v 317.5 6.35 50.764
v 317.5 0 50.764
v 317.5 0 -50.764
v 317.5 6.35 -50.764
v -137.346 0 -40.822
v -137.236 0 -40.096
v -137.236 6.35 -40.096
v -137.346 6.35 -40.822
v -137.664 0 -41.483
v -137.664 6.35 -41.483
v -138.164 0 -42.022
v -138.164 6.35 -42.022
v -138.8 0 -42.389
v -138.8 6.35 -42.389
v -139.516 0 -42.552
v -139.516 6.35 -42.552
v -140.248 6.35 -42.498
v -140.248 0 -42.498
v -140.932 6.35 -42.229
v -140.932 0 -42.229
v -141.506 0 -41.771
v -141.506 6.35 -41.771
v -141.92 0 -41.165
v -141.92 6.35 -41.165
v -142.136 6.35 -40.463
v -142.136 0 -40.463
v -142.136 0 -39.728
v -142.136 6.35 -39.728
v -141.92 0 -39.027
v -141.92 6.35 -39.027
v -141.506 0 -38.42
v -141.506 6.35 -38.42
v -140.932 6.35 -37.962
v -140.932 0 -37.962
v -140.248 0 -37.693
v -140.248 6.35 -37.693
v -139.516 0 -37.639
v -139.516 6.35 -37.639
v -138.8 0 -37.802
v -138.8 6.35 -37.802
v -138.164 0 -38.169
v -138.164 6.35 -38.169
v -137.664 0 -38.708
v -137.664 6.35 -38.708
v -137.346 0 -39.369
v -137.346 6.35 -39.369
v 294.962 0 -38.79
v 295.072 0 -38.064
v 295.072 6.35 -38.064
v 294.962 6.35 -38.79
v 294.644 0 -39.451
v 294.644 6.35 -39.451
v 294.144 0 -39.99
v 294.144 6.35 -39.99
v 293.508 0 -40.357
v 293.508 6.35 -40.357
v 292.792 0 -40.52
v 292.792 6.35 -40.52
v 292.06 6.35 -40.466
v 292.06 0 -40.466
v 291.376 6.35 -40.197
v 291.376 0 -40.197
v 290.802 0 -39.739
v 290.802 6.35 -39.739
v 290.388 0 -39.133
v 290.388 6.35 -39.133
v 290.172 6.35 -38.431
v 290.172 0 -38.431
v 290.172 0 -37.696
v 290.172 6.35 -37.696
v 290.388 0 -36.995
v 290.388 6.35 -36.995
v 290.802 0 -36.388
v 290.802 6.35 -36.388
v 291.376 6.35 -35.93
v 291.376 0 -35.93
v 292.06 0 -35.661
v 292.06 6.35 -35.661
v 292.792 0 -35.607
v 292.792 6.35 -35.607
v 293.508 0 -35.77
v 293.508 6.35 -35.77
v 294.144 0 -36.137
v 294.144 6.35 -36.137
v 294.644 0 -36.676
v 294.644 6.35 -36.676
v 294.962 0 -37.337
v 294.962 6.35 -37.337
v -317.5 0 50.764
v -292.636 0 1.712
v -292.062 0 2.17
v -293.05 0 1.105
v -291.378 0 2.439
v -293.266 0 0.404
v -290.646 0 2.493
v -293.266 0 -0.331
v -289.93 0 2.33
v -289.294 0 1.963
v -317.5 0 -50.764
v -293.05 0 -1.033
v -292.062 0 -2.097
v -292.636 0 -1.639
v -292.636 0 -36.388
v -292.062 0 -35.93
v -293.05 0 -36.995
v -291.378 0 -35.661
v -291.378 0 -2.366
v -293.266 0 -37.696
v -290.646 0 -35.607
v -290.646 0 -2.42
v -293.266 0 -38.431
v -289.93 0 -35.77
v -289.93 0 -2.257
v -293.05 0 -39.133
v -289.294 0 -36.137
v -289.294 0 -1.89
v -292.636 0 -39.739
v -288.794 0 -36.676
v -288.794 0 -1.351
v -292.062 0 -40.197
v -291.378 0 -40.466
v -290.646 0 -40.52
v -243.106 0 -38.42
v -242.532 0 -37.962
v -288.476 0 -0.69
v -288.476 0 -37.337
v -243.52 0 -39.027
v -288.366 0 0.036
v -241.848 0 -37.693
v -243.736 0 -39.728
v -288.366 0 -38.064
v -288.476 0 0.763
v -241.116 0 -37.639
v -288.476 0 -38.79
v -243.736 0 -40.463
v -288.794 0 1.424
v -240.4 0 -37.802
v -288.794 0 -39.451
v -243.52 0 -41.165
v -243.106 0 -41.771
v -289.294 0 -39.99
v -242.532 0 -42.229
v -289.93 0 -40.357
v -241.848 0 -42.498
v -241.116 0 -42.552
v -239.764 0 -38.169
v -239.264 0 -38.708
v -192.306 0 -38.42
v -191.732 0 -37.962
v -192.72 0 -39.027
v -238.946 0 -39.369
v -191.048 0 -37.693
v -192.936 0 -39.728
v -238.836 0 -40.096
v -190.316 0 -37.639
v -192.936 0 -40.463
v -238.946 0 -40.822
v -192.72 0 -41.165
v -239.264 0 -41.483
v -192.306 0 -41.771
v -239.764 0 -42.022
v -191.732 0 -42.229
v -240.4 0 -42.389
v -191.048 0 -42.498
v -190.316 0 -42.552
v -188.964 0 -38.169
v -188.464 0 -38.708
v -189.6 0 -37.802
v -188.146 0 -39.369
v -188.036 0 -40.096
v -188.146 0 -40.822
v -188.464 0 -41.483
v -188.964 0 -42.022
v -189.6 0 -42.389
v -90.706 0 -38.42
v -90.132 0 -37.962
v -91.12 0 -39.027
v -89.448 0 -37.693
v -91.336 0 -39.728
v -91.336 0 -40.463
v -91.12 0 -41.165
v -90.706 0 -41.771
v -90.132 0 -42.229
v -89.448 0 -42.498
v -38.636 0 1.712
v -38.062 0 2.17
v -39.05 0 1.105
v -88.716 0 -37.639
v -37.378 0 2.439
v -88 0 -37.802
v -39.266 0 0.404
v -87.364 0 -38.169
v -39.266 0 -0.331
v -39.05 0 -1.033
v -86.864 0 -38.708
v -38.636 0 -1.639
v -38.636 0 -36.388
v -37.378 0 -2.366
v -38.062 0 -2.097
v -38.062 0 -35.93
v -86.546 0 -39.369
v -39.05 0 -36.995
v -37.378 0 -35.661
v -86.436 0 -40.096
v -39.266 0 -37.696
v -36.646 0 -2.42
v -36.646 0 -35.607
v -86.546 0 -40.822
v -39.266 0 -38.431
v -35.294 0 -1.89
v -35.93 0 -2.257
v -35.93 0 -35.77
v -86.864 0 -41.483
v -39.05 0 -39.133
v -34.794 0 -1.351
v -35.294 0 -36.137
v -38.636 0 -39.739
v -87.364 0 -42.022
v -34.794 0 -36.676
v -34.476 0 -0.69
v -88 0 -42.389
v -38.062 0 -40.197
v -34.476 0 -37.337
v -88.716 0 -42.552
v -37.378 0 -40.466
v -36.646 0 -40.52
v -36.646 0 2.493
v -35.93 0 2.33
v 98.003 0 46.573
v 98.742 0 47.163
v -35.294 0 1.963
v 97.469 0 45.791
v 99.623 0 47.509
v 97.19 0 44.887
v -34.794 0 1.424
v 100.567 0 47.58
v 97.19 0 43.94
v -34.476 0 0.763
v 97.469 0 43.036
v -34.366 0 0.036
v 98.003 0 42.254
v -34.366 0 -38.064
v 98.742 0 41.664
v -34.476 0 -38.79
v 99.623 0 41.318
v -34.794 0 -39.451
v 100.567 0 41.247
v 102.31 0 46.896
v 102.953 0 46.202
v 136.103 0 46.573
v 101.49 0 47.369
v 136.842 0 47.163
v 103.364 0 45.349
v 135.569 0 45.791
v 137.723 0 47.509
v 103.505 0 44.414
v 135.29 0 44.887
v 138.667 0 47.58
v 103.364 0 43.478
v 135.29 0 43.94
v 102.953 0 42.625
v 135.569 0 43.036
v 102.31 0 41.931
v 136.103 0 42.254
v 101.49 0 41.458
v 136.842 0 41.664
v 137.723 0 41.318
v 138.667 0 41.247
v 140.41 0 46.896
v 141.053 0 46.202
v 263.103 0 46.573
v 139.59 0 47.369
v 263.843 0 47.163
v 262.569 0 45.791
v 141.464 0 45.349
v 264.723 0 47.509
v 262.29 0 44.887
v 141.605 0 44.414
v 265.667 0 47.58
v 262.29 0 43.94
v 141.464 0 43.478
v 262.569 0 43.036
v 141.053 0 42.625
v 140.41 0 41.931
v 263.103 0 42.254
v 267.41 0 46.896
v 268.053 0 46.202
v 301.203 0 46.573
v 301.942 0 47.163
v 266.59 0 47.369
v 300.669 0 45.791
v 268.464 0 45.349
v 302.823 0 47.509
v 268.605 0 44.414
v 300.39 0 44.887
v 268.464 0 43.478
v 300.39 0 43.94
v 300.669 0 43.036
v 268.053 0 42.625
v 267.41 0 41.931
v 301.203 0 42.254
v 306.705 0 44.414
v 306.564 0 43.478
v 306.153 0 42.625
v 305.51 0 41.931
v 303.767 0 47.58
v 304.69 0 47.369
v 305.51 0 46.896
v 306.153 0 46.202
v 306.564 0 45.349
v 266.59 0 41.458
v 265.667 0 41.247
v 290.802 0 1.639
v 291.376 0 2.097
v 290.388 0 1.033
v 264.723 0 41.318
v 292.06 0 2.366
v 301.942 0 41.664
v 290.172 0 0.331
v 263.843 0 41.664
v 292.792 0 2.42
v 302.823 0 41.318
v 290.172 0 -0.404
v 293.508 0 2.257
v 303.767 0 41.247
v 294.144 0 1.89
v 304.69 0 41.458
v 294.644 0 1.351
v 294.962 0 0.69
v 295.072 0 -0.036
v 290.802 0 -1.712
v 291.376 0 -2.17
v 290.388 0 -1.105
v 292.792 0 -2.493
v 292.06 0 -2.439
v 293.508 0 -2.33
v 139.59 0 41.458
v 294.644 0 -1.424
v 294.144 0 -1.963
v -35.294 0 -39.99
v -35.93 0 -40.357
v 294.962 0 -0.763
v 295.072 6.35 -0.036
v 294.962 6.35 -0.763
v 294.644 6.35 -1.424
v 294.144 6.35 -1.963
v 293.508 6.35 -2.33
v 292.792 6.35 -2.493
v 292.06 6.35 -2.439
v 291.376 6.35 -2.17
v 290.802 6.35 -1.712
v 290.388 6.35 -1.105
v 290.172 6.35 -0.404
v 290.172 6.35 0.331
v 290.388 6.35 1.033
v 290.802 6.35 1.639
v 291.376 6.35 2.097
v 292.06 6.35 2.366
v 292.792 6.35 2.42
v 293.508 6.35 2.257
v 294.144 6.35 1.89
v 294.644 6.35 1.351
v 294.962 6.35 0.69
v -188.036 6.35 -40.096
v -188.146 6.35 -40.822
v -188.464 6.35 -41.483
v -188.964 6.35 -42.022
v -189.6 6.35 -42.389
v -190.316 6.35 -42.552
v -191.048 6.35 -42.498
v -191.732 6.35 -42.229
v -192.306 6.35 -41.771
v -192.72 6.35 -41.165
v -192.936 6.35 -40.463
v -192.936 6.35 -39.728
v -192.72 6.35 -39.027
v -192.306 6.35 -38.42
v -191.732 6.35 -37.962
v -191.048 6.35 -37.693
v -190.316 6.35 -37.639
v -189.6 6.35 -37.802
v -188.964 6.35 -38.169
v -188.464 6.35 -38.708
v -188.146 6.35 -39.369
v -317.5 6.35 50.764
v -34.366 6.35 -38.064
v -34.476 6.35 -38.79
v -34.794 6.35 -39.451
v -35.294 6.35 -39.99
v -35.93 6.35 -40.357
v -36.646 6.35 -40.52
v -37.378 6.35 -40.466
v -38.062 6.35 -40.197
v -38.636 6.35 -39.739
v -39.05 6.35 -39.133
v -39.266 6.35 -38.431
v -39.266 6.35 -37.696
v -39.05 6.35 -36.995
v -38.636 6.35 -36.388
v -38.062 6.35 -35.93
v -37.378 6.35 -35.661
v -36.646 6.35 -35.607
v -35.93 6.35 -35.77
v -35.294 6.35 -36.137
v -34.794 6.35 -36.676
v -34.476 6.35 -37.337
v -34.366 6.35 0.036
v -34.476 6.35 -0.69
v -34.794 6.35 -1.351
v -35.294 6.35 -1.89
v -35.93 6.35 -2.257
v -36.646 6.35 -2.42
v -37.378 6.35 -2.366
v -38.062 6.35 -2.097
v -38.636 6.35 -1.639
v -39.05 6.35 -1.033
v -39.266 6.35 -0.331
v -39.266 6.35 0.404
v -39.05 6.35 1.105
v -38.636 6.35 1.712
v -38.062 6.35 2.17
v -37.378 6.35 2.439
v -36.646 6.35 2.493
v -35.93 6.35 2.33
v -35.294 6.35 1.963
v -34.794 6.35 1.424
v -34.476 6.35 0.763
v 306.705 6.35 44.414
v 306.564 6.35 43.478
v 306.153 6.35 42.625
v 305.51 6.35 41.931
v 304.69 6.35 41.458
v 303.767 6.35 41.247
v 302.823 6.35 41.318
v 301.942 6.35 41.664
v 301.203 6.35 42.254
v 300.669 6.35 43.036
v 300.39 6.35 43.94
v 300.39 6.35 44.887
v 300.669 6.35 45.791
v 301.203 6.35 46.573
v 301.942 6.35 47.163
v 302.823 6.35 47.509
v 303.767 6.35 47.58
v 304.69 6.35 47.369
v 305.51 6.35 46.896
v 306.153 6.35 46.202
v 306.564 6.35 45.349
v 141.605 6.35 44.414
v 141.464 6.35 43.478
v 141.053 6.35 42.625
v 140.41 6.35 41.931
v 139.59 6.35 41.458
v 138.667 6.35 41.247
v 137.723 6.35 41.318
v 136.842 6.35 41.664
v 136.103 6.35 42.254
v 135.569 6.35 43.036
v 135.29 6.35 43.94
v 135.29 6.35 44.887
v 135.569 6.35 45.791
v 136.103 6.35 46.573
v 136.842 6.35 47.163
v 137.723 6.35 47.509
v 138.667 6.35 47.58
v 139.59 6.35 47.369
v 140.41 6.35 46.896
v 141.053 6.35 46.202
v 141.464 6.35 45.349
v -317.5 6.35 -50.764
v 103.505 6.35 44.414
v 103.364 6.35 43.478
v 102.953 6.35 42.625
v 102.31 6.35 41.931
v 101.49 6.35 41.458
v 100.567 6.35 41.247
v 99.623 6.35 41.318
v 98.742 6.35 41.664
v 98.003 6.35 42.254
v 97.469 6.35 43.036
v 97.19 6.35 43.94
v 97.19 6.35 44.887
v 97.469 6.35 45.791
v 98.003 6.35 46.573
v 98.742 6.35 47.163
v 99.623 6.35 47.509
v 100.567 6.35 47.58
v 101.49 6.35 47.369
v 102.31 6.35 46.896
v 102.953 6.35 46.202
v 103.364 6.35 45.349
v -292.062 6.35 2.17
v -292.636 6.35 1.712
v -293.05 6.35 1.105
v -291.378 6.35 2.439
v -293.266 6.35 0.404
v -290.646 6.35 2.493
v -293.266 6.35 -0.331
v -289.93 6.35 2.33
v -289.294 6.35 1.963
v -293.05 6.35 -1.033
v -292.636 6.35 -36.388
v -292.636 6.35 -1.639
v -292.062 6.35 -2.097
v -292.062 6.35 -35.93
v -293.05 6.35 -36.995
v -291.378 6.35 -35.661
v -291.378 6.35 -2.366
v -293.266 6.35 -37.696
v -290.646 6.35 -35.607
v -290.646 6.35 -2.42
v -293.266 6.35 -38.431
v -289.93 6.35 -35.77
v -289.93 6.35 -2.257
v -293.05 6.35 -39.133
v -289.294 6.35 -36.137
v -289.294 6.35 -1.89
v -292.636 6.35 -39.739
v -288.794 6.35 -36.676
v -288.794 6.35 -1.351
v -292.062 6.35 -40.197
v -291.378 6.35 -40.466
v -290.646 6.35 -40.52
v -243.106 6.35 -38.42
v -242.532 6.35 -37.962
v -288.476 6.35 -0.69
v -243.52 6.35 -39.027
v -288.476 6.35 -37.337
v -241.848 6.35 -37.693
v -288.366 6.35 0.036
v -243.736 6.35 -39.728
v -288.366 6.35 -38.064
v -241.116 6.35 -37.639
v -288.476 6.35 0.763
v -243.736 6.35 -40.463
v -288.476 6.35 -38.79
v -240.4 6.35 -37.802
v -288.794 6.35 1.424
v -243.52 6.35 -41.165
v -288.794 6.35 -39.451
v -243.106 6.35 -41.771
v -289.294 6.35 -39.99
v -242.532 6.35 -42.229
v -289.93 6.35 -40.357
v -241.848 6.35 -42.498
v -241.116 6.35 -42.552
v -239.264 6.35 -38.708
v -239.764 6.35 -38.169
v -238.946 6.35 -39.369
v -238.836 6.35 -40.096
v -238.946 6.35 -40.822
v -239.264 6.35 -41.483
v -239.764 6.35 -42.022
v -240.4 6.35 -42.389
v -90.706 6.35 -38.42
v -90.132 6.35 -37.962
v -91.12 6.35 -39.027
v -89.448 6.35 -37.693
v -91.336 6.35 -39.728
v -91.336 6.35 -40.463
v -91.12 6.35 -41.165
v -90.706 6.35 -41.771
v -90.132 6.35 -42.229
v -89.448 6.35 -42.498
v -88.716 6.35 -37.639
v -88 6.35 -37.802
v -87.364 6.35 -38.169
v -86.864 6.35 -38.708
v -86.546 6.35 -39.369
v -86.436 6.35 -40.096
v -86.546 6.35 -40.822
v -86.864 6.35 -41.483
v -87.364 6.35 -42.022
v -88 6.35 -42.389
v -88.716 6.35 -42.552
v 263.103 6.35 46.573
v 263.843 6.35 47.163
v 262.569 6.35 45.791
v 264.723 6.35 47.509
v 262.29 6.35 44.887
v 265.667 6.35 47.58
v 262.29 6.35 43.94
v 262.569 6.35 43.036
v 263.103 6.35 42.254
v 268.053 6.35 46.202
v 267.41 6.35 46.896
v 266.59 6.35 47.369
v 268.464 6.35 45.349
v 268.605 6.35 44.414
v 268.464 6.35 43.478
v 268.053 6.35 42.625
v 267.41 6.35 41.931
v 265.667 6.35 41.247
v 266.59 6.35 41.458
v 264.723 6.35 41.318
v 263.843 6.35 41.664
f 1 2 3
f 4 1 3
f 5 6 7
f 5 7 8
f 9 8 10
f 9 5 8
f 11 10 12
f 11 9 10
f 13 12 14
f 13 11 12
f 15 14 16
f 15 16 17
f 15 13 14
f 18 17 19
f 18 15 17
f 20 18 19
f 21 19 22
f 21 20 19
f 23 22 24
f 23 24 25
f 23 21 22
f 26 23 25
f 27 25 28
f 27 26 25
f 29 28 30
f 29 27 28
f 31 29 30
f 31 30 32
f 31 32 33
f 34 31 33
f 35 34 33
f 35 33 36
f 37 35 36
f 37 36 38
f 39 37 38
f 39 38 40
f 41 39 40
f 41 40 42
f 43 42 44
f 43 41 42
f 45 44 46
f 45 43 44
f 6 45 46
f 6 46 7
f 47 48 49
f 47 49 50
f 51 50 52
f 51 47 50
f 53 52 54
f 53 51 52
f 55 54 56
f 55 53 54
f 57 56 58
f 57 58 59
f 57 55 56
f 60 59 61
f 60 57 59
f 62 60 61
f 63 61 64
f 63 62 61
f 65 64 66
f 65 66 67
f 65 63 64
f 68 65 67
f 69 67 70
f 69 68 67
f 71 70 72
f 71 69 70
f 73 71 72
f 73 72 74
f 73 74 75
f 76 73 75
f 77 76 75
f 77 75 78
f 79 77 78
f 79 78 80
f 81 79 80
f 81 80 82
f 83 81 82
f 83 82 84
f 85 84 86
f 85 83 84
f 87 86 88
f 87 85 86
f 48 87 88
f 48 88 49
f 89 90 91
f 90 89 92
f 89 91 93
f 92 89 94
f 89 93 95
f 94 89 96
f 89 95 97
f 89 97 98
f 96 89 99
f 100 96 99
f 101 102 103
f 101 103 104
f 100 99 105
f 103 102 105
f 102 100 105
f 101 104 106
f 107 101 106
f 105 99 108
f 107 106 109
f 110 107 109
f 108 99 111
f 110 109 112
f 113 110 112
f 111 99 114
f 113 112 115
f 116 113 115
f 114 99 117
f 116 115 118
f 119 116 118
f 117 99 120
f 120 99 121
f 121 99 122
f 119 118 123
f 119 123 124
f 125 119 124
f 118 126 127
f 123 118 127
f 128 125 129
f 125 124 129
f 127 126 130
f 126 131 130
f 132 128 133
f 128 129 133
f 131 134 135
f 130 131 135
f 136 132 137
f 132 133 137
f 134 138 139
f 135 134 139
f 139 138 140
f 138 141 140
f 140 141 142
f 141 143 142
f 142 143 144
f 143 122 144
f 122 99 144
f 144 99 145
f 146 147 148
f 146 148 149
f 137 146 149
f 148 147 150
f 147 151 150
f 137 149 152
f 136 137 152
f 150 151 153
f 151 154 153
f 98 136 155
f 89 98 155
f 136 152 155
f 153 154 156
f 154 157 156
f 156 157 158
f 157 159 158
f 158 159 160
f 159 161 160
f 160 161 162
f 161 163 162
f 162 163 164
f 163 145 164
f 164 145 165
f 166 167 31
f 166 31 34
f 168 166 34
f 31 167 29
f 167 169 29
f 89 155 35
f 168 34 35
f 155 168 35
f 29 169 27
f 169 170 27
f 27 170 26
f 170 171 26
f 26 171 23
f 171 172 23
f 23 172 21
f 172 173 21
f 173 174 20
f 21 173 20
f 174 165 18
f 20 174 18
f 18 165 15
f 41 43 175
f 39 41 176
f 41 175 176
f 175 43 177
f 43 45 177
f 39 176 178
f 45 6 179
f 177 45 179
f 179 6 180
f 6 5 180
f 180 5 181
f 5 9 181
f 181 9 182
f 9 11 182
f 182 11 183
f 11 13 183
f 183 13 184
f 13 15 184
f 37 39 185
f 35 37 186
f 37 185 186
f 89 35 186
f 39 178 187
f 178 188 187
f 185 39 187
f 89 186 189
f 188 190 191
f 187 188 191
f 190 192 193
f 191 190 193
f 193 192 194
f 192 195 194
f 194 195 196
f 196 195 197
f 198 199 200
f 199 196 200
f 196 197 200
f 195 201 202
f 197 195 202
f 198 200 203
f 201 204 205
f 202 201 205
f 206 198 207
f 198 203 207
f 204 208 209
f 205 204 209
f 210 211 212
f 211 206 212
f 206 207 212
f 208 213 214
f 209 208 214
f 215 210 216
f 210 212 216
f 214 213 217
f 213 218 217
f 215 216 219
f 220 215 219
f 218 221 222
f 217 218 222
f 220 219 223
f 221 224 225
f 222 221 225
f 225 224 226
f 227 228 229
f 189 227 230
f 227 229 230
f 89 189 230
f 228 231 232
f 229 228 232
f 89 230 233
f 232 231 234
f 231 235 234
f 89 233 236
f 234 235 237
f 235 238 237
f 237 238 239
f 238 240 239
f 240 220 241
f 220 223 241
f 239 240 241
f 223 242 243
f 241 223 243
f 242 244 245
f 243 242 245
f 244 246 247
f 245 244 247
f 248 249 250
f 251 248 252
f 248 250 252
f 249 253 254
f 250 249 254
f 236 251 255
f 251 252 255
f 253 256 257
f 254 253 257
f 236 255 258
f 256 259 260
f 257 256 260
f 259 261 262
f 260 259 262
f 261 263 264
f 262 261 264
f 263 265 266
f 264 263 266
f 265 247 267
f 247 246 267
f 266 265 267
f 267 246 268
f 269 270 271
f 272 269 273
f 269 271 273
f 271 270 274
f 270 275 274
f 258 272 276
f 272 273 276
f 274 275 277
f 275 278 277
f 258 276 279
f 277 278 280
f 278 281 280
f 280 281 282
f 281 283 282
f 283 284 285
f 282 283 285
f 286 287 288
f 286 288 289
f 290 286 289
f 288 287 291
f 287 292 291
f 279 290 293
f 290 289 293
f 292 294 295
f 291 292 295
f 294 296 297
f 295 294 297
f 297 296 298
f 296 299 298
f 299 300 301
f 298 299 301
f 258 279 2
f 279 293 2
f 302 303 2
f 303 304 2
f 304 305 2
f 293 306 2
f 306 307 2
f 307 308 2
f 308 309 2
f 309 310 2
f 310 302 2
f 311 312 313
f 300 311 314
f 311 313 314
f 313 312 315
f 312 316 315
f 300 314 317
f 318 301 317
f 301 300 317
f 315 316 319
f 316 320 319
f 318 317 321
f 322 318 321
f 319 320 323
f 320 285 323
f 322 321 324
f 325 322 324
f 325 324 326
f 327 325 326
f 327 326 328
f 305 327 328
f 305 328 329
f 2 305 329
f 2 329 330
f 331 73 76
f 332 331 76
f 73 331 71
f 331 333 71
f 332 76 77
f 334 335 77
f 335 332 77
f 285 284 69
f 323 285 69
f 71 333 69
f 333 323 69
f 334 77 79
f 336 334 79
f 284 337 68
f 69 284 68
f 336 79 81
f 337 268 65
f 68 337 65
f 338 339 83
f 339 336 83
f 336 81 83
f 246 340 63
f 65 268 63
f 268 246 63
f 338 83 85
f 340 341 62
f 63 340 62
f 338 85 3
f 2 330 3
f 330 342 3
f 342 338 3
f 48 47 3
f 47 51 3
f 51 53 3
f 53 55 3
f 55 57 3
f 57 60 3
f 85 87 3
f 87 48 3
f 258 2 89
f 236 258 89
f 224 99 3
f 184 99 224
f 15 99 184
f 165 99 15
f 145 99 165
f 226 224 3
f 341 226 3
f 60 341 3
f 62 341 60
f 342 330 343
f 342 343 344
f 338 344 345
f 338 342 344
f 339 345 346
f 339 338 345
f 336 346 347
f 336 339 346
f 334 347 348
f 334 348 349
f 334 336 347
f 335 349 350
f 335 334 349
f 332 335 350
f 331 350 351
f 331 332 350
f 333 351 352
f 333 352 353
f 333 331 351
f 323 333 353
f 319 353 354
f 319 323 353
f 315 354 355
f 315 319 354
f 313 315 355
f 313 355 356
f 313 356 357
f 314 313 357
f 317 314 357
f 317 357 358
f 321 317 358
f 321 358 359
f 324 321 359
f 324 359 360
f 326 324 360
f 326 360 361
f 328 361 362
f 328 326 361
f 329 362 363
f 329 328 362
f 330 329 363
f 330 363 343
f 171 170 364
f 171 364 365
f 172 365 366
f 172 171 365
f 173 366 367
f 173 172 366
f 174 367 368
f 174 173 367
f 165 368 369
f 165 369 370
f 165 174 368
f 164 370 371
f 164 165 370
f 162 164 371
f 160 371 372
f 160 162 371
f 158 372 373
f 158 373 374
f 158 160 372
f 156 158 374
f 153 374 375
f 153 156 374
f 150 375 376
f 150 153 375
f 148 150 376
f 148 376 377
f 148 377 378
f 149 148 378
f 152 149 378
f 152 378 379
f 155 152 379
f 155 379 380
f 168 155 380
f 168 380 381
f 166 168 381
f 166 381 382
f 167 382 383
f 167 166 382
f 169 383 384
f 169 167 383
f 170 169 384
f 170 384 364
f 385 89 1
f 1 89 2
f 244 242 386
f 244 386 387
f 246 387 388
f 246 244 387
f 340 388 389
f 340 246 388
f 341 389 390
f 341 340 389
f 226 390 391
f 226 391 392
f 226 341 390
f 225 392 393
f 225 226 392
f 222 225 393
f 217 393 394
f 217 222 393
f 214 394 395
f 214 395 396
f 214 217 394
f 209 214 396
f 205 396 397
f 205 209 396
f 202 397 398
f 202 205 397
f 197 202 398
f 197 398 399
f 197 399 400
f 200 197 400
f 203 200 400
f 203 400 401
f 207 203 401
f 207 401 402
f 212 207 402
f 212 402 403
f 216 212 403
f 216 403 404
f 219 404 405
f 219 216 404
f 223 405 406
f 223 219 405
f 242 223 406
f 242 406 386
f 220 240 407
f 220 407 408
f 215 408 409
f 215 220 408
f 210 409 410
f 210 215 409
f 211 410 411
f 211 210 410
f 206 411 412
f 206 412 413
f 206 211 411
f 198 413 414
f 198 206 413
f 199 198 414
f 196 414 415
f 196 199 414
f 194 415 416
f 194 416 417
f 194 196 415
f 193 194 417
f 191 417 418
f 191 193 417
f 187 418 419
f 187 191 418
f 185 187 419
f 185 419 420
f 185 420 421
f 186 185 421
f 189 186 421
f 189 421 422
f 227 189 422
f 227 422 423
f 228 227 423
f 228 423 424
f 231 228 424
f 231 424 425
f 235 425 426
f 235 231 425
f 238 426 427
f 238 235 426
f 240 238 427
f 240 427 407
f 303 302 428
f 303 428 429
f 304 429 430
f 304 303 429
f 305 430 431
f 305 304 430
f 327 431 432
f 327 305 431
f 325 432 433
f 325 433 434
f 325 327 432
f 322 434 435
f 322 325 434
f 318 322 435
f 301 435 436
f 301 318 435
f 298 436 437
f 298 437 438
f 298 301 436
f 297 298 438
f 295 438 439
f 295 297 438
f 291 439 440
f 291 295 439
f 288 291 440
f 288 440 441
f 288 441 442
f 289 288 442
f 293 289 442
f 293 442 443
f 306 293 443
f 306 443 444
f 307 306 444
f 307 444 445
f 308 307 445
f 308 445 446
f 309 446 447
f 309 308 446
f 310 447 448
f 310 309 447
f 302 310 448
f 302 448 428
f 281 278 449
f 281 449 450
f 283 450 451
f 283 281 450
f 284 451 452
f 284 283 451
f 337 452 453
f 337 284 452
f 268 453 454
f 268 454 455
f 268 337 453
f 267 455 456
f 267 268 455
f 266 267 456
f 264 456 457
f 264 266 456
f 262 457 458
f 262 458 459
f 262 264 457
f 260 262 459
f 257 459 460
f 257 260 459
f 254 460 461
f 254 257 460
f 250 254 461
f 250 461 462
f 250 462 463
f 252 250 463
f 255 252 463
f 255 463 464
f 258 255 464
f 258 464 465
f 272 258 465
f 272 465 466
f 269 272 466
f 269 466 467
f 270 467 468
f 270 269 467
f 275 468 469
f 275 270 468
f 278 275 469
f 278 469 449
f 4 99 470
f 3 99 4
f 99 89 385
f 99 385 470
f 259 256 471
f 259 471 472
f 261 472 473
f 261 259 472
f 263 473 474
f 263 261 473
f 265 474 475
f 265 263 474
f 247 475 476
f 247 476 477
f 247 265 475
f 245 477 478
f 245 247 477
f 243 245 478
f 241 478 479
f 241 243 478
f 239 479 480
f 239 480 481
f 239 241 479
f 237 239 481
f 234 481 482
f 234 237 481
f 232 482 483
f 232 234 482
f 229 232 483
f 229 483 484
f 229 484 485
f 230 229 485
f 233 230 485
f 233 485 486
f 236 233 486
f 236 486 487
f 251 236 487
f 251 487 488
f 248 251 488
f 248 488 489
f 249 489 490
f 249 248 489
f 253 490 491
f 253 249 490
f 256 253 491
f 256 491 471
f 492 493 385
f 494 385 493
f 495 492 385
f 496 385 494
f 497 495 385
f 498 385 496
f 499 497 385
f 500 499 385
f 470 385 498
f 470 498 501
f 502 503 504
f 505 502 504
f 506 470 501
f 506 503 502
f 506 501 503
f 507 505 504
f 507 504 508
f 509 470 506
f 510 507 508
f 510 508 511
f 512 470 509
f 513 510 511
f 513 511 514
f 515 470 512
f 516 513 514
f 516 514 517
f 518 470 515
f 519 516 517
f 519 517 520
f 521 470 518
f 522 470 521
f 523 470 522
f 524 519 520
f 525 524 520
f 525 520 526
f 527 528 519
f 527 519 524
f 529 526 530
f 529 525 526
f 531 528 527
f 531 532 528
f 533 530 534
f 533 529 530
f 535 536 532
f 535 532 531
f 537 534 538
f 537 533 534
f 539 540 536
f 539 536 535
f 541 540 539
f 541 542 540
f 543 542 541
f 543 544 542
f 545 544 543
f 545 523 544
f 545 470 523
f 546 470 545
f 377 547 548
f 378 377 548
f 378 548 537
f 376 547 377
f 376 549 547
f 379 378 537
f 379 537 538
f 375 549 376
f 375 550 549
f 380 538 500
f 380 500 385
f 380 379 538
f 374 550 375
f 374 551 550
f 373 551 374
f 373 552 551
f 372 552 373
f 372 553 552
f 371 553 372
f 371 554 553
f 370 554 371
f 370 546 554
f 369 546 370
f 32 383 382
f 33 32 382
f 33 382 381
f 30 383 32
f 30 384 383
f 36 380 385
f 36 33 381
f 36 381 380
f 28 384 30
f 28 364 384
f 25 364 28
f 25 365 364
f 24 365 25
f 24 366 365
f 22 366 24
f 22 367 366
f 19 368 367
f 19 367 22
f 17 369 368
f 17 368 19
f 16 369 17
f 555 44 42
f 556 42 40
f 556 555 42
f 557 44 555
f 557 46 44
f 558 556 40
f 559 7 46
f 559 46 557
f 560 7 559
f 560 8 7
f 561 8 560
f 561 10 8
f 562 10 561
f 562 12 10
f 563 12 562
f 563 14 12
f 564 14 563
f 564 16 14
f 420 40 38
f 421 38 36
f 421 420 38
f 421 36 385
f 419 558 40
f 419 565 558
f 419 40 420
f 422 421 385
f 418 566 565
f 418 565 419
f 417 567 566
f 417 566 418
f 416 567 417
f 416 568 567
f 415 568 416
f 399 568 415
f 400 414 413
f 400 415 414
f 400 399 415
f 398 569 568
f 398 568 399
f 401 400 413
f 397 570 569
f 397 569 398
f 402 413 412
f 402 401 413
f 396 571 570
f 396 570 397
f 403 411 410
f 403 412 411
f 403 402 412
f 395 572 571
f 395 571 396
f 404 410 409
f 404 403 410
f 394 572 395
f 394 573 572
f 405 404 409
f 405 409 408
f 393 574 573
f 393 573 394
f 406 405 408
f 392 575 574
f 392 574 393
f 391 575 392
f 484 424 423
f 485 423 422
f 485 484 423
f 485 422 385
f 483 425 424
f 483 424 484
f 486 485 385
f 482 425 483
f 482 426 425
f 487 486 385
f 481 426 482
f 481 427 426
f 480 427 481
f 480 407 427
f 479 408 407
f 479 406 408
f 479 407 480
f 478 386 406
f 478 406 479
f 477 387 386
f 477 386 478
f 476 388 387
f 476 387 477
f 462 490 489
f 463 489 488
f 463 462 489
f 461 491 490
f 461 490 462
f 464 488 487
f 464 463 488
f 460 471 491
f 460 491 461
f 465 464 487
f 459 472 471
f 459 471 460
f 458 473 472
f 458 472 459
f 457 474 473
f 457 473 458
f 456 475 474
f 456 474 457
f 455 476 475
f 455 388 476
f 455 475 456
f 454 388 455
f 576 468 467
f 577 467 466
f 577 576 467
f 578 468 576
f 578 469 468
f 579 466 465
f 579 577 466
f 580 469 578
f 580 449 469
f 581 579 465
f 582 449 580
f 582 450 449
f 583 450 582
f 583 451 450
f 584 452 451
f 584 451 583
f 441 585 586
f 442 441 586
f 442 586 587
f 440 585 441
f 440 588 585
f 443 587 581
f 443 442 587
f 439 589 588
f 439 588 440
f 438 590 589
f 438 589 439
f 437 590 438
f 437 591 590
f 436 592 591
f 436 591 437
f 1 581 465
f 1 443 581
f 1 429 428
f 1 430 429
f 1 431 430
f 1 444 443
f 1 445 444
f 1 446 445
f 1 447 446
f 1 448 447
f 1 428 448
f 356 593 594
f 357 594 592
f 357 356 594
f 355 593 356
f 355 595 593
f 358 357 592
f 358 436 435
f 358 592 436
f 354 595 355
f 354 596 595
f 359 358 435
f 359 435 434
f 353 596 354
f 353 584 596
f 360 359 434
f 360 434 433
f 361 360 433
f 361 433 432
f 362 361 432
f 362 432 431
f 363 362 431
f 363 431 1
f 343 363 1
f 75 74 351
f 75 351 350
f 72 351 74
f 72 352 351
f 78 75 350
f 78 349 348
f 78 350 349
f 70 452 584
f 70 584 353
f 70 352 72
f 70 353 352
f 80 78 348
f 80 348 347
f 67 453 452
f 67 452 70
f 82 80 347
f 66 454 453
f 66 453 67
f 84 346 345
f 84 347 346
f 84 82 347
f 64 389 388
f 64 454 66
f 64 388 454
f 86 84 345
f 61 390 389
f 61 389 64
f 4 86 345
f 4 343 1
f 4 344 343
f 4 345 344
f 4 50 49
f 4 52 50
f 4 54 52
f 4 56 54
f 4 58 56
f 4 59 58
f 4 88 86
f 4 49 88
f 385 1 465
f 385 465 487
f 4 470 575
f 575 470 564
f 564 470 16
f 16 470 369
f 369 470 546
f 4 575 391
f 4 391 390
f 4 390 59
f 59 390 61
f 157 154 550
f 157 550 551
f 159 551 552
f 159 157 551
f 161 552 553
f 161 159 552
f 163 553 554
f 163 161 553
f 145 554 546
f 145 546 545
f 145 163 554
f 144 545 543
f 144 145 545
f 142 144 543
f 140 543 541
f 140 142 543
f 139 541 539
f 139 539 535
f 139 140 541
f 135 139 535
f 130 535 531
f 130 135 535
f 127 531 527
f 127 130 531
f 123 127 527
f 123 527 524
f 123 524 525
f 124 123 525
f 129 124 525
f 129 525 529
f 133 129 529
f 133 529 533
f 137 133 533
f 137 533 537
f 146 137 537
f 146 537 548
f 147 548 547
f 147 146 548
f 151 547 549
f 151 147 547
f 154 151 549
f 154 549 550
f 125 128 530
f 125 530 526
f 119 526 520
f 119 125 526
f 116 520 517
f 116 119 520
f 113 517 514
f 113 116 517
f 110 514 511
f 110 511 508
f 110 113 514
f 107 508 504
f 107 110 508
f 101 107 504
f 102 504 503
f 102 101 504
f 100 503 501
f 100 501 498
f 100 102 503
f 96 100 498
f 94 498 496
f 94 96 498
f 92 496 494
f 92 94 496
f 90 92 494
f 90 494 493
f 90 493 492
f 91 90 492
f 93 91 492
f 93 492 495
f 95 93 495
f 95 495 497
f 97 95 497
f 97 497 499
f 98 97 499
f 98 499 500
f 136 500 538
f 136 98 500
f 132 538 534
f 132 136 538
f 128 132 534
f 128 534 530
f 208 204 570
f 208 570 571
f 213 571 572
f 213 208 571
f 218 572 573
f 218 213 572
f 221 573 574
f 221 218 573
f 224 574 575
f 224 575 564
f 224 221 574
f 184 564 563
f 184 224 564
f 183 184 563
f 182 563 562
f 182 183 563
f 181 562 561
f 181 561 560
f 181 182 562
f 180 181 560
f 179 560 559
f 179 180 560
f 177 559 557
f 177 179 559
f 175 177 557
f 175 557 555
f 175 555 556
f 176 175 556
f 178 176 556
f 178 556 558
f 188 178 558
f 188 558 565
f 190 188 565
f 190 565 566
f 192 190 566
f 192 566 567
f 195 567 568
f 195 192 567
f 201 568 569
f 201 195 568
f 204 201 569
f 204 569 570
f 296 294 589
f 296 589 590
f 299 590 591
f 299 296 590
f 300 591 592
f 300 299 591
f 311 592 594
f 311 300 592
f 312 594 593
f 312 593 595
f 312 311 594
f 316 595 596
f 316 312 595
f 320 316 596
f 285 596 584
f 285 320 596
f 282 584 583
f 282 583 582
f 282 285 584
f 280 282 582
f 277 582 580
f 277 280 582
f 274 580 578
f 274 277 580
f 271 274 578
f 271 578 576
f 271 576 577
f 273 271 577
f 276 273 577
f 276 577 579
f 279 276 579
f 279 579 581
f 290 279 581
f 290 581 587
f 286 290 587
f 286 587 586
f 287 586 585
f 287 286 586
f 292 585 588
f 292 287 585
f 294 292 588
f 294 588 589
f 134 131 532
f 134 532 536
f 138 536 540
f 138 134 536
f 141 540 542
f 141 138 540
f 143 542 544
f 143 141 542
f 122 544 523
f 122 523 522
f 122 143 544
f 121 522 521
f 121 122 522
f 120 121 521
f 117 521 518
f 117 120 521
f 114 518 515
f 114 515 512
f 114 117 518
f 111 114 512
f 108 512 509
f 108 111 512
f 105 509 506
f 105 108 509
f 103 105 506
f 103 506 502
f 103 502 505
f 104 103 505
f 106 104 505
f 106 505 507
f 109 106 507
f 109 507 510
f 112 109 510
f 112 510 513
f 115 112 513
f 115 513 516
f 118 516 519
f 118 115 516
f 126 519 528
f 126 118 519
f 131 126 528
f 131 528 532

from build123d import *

# Parameters (mm, degrees)
SKETCH1_W           = 635
SKETCH1_H           = 101.527009672
SKETCH1_R           = 2.4638
SKETCH1_R_2         = 3.175
BOSS_EXTRUDE1_DEPTH = 6.35


with BuildPart() as part:
    # Sketch1 → Boss-Extrude1 (new body)
    with BuildSketch(Plane(origin=(0, 0, 0), x_dir=(1, 0, 0), z_dir=(0, 1, 0))):
        Rectangle(SKETCH1_W, SKETCH1_H)
        with Locations((-290.83, 38.063504836)):
            Circle(SKETCH1_R, mode=Mode.SUBTRACT)
        with Locations((-290.83, -0.036495164)):
            Circle(SKETCH1_R, mode=Mode.SUBTRACT)
        with Locations((292.608, 0.036495164)):
            Circle(SKETCH1_R, mode=Mode.SUBTRACT)
        with Locations((292.608, 38.063504836)):
            Circle(SKETCH1_R, mode=Mode.SUBTRACT)
        with Locations((-241.3, 40.095504834)):
            Circle(SKETCH1_R, mode=Mode.SUBTRACT)
        with Locations((-36.829999998, 38.063504838)):
            Circle(SKETCH1_R, mode=Mode.SUBTRACT)
        with Locations((-36.829999998, -0.036495162)):
            Circle(SKETCH1_R, mode=Mode.SUBTRACT)
        with Locations((100.33, -44.413504836)):
            Circle(SKETCH1_R_2, mode=Mode.SUBTRACT)
        with Locations((138.43, -44.413504836)):
            Circle(SKETCH1_R_2, mode=Mode.SUBTRACT)
        with Locations((303.53, -44.413504836)):
            Circle(SKETCH1_R_2, mode=Mode.SUBTRACT)
        with Locations((265.43, -44.413504836)):
            Circle(SKETCH1_R_2, mode=Mode.SUBTRACT)
        with Locations((-190.5, 40.095504834)):
            Circle(SKETCH1_R, mode=Mode.SUBTRACT)
        with Locations((-139.7, 40.095504834)):
            Circle(SKETCH1_R, mode=Mode.SUBTRACT)
        with Locations((-88.9, 40.095504834)):
            Circle(SKETCH1_R, mode=Mode.SUBTRACT)
    extrude(amount=BOSS_EXTRUDE1_DEPTH)


solid = part.part
